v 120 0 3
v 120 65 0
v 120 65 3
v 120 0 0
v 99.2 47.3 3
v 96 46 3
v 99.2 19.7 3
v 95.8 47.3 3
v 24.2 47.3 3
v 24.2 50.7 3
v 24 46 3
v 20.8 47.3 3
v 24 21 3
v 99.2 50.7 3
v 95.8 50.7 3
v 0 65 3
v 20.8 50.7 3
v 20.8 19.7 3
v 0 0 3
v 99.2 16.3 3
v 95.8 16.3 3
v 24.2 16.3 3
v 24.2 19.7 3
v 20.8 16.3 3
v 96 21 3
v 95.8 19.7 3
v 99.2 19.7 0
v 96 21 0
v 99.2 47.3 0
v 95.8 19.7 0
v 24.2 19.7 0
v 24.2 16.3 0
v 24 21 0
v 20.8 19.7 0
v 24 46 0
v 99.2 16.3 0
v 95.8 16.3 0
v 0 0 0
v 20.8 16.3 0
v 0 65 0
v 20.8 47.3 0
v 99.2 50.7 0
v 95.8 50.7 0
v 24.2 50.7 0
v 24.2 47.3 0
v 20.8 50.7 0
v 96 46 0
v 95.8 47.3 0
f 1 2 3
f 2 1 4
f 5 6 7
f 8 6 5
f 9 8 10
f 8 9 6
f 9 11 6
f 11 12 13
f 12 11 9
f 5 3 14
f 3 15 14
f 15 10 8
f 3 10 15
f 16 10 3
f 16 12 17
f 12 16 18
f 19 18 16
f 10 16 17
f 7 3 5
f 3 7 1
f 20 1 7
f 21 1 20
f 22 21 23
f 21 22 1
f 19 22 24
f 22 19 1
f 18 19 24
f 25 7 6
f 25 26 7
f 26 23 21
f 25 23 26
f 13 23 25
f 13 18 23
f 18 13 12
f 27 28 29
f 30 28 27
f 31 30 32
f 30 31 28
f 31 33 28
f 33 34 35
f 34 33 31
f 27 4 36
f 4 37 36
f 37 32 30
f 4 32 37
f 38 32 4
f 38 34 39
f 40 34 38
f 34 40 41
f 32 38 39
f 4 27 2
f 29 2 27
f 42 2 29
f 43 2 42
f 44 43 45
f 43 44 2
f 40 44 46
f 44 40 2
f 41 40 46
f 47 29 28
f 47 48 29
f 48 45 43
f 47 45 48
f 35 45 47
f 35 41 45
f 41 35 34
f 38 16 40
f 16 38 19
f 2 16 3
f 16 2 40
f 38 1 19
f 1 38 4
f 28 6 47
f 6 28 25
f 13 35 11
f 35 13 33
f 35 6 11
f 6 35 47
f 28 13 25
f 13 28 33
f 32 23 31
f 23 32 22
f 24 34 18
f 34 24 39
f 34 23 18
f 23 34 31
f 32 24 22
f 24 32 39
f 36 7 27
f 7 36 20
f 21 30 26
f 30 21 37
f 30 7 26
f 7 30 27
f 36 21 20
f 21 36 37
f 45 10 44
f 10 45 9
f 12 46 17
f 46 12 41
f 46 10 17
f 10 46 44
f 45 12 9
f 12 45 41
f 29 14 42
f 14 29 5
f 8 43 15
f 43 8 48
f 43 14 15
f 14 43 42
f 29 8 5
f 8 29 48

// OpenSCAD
// TEMPLATE ONLY. Measure and edit before printing. Millimetres.
difference(){union(){
translate([0, 0, 0]) cube([120, 65, 3]);
}
translate([24, 21, -1]) cube([72, 25, 5]);
translate([20.8, 16.3, -1]) cube([3.3999999999999986, 3.3999999999999986, 5]);
translate([95.8, 16.3, -1]) cube([3.4000000000000057, 3.3999999999999986, 5]);
translate([20.8, 47.3, -1]) cube([3.3999999999999986, 3.4000000000000057, 5]);
translate([95.8, 47.3, -1]) cube([3.4000000000000057, 3.4000000000000057, 5]);
}
